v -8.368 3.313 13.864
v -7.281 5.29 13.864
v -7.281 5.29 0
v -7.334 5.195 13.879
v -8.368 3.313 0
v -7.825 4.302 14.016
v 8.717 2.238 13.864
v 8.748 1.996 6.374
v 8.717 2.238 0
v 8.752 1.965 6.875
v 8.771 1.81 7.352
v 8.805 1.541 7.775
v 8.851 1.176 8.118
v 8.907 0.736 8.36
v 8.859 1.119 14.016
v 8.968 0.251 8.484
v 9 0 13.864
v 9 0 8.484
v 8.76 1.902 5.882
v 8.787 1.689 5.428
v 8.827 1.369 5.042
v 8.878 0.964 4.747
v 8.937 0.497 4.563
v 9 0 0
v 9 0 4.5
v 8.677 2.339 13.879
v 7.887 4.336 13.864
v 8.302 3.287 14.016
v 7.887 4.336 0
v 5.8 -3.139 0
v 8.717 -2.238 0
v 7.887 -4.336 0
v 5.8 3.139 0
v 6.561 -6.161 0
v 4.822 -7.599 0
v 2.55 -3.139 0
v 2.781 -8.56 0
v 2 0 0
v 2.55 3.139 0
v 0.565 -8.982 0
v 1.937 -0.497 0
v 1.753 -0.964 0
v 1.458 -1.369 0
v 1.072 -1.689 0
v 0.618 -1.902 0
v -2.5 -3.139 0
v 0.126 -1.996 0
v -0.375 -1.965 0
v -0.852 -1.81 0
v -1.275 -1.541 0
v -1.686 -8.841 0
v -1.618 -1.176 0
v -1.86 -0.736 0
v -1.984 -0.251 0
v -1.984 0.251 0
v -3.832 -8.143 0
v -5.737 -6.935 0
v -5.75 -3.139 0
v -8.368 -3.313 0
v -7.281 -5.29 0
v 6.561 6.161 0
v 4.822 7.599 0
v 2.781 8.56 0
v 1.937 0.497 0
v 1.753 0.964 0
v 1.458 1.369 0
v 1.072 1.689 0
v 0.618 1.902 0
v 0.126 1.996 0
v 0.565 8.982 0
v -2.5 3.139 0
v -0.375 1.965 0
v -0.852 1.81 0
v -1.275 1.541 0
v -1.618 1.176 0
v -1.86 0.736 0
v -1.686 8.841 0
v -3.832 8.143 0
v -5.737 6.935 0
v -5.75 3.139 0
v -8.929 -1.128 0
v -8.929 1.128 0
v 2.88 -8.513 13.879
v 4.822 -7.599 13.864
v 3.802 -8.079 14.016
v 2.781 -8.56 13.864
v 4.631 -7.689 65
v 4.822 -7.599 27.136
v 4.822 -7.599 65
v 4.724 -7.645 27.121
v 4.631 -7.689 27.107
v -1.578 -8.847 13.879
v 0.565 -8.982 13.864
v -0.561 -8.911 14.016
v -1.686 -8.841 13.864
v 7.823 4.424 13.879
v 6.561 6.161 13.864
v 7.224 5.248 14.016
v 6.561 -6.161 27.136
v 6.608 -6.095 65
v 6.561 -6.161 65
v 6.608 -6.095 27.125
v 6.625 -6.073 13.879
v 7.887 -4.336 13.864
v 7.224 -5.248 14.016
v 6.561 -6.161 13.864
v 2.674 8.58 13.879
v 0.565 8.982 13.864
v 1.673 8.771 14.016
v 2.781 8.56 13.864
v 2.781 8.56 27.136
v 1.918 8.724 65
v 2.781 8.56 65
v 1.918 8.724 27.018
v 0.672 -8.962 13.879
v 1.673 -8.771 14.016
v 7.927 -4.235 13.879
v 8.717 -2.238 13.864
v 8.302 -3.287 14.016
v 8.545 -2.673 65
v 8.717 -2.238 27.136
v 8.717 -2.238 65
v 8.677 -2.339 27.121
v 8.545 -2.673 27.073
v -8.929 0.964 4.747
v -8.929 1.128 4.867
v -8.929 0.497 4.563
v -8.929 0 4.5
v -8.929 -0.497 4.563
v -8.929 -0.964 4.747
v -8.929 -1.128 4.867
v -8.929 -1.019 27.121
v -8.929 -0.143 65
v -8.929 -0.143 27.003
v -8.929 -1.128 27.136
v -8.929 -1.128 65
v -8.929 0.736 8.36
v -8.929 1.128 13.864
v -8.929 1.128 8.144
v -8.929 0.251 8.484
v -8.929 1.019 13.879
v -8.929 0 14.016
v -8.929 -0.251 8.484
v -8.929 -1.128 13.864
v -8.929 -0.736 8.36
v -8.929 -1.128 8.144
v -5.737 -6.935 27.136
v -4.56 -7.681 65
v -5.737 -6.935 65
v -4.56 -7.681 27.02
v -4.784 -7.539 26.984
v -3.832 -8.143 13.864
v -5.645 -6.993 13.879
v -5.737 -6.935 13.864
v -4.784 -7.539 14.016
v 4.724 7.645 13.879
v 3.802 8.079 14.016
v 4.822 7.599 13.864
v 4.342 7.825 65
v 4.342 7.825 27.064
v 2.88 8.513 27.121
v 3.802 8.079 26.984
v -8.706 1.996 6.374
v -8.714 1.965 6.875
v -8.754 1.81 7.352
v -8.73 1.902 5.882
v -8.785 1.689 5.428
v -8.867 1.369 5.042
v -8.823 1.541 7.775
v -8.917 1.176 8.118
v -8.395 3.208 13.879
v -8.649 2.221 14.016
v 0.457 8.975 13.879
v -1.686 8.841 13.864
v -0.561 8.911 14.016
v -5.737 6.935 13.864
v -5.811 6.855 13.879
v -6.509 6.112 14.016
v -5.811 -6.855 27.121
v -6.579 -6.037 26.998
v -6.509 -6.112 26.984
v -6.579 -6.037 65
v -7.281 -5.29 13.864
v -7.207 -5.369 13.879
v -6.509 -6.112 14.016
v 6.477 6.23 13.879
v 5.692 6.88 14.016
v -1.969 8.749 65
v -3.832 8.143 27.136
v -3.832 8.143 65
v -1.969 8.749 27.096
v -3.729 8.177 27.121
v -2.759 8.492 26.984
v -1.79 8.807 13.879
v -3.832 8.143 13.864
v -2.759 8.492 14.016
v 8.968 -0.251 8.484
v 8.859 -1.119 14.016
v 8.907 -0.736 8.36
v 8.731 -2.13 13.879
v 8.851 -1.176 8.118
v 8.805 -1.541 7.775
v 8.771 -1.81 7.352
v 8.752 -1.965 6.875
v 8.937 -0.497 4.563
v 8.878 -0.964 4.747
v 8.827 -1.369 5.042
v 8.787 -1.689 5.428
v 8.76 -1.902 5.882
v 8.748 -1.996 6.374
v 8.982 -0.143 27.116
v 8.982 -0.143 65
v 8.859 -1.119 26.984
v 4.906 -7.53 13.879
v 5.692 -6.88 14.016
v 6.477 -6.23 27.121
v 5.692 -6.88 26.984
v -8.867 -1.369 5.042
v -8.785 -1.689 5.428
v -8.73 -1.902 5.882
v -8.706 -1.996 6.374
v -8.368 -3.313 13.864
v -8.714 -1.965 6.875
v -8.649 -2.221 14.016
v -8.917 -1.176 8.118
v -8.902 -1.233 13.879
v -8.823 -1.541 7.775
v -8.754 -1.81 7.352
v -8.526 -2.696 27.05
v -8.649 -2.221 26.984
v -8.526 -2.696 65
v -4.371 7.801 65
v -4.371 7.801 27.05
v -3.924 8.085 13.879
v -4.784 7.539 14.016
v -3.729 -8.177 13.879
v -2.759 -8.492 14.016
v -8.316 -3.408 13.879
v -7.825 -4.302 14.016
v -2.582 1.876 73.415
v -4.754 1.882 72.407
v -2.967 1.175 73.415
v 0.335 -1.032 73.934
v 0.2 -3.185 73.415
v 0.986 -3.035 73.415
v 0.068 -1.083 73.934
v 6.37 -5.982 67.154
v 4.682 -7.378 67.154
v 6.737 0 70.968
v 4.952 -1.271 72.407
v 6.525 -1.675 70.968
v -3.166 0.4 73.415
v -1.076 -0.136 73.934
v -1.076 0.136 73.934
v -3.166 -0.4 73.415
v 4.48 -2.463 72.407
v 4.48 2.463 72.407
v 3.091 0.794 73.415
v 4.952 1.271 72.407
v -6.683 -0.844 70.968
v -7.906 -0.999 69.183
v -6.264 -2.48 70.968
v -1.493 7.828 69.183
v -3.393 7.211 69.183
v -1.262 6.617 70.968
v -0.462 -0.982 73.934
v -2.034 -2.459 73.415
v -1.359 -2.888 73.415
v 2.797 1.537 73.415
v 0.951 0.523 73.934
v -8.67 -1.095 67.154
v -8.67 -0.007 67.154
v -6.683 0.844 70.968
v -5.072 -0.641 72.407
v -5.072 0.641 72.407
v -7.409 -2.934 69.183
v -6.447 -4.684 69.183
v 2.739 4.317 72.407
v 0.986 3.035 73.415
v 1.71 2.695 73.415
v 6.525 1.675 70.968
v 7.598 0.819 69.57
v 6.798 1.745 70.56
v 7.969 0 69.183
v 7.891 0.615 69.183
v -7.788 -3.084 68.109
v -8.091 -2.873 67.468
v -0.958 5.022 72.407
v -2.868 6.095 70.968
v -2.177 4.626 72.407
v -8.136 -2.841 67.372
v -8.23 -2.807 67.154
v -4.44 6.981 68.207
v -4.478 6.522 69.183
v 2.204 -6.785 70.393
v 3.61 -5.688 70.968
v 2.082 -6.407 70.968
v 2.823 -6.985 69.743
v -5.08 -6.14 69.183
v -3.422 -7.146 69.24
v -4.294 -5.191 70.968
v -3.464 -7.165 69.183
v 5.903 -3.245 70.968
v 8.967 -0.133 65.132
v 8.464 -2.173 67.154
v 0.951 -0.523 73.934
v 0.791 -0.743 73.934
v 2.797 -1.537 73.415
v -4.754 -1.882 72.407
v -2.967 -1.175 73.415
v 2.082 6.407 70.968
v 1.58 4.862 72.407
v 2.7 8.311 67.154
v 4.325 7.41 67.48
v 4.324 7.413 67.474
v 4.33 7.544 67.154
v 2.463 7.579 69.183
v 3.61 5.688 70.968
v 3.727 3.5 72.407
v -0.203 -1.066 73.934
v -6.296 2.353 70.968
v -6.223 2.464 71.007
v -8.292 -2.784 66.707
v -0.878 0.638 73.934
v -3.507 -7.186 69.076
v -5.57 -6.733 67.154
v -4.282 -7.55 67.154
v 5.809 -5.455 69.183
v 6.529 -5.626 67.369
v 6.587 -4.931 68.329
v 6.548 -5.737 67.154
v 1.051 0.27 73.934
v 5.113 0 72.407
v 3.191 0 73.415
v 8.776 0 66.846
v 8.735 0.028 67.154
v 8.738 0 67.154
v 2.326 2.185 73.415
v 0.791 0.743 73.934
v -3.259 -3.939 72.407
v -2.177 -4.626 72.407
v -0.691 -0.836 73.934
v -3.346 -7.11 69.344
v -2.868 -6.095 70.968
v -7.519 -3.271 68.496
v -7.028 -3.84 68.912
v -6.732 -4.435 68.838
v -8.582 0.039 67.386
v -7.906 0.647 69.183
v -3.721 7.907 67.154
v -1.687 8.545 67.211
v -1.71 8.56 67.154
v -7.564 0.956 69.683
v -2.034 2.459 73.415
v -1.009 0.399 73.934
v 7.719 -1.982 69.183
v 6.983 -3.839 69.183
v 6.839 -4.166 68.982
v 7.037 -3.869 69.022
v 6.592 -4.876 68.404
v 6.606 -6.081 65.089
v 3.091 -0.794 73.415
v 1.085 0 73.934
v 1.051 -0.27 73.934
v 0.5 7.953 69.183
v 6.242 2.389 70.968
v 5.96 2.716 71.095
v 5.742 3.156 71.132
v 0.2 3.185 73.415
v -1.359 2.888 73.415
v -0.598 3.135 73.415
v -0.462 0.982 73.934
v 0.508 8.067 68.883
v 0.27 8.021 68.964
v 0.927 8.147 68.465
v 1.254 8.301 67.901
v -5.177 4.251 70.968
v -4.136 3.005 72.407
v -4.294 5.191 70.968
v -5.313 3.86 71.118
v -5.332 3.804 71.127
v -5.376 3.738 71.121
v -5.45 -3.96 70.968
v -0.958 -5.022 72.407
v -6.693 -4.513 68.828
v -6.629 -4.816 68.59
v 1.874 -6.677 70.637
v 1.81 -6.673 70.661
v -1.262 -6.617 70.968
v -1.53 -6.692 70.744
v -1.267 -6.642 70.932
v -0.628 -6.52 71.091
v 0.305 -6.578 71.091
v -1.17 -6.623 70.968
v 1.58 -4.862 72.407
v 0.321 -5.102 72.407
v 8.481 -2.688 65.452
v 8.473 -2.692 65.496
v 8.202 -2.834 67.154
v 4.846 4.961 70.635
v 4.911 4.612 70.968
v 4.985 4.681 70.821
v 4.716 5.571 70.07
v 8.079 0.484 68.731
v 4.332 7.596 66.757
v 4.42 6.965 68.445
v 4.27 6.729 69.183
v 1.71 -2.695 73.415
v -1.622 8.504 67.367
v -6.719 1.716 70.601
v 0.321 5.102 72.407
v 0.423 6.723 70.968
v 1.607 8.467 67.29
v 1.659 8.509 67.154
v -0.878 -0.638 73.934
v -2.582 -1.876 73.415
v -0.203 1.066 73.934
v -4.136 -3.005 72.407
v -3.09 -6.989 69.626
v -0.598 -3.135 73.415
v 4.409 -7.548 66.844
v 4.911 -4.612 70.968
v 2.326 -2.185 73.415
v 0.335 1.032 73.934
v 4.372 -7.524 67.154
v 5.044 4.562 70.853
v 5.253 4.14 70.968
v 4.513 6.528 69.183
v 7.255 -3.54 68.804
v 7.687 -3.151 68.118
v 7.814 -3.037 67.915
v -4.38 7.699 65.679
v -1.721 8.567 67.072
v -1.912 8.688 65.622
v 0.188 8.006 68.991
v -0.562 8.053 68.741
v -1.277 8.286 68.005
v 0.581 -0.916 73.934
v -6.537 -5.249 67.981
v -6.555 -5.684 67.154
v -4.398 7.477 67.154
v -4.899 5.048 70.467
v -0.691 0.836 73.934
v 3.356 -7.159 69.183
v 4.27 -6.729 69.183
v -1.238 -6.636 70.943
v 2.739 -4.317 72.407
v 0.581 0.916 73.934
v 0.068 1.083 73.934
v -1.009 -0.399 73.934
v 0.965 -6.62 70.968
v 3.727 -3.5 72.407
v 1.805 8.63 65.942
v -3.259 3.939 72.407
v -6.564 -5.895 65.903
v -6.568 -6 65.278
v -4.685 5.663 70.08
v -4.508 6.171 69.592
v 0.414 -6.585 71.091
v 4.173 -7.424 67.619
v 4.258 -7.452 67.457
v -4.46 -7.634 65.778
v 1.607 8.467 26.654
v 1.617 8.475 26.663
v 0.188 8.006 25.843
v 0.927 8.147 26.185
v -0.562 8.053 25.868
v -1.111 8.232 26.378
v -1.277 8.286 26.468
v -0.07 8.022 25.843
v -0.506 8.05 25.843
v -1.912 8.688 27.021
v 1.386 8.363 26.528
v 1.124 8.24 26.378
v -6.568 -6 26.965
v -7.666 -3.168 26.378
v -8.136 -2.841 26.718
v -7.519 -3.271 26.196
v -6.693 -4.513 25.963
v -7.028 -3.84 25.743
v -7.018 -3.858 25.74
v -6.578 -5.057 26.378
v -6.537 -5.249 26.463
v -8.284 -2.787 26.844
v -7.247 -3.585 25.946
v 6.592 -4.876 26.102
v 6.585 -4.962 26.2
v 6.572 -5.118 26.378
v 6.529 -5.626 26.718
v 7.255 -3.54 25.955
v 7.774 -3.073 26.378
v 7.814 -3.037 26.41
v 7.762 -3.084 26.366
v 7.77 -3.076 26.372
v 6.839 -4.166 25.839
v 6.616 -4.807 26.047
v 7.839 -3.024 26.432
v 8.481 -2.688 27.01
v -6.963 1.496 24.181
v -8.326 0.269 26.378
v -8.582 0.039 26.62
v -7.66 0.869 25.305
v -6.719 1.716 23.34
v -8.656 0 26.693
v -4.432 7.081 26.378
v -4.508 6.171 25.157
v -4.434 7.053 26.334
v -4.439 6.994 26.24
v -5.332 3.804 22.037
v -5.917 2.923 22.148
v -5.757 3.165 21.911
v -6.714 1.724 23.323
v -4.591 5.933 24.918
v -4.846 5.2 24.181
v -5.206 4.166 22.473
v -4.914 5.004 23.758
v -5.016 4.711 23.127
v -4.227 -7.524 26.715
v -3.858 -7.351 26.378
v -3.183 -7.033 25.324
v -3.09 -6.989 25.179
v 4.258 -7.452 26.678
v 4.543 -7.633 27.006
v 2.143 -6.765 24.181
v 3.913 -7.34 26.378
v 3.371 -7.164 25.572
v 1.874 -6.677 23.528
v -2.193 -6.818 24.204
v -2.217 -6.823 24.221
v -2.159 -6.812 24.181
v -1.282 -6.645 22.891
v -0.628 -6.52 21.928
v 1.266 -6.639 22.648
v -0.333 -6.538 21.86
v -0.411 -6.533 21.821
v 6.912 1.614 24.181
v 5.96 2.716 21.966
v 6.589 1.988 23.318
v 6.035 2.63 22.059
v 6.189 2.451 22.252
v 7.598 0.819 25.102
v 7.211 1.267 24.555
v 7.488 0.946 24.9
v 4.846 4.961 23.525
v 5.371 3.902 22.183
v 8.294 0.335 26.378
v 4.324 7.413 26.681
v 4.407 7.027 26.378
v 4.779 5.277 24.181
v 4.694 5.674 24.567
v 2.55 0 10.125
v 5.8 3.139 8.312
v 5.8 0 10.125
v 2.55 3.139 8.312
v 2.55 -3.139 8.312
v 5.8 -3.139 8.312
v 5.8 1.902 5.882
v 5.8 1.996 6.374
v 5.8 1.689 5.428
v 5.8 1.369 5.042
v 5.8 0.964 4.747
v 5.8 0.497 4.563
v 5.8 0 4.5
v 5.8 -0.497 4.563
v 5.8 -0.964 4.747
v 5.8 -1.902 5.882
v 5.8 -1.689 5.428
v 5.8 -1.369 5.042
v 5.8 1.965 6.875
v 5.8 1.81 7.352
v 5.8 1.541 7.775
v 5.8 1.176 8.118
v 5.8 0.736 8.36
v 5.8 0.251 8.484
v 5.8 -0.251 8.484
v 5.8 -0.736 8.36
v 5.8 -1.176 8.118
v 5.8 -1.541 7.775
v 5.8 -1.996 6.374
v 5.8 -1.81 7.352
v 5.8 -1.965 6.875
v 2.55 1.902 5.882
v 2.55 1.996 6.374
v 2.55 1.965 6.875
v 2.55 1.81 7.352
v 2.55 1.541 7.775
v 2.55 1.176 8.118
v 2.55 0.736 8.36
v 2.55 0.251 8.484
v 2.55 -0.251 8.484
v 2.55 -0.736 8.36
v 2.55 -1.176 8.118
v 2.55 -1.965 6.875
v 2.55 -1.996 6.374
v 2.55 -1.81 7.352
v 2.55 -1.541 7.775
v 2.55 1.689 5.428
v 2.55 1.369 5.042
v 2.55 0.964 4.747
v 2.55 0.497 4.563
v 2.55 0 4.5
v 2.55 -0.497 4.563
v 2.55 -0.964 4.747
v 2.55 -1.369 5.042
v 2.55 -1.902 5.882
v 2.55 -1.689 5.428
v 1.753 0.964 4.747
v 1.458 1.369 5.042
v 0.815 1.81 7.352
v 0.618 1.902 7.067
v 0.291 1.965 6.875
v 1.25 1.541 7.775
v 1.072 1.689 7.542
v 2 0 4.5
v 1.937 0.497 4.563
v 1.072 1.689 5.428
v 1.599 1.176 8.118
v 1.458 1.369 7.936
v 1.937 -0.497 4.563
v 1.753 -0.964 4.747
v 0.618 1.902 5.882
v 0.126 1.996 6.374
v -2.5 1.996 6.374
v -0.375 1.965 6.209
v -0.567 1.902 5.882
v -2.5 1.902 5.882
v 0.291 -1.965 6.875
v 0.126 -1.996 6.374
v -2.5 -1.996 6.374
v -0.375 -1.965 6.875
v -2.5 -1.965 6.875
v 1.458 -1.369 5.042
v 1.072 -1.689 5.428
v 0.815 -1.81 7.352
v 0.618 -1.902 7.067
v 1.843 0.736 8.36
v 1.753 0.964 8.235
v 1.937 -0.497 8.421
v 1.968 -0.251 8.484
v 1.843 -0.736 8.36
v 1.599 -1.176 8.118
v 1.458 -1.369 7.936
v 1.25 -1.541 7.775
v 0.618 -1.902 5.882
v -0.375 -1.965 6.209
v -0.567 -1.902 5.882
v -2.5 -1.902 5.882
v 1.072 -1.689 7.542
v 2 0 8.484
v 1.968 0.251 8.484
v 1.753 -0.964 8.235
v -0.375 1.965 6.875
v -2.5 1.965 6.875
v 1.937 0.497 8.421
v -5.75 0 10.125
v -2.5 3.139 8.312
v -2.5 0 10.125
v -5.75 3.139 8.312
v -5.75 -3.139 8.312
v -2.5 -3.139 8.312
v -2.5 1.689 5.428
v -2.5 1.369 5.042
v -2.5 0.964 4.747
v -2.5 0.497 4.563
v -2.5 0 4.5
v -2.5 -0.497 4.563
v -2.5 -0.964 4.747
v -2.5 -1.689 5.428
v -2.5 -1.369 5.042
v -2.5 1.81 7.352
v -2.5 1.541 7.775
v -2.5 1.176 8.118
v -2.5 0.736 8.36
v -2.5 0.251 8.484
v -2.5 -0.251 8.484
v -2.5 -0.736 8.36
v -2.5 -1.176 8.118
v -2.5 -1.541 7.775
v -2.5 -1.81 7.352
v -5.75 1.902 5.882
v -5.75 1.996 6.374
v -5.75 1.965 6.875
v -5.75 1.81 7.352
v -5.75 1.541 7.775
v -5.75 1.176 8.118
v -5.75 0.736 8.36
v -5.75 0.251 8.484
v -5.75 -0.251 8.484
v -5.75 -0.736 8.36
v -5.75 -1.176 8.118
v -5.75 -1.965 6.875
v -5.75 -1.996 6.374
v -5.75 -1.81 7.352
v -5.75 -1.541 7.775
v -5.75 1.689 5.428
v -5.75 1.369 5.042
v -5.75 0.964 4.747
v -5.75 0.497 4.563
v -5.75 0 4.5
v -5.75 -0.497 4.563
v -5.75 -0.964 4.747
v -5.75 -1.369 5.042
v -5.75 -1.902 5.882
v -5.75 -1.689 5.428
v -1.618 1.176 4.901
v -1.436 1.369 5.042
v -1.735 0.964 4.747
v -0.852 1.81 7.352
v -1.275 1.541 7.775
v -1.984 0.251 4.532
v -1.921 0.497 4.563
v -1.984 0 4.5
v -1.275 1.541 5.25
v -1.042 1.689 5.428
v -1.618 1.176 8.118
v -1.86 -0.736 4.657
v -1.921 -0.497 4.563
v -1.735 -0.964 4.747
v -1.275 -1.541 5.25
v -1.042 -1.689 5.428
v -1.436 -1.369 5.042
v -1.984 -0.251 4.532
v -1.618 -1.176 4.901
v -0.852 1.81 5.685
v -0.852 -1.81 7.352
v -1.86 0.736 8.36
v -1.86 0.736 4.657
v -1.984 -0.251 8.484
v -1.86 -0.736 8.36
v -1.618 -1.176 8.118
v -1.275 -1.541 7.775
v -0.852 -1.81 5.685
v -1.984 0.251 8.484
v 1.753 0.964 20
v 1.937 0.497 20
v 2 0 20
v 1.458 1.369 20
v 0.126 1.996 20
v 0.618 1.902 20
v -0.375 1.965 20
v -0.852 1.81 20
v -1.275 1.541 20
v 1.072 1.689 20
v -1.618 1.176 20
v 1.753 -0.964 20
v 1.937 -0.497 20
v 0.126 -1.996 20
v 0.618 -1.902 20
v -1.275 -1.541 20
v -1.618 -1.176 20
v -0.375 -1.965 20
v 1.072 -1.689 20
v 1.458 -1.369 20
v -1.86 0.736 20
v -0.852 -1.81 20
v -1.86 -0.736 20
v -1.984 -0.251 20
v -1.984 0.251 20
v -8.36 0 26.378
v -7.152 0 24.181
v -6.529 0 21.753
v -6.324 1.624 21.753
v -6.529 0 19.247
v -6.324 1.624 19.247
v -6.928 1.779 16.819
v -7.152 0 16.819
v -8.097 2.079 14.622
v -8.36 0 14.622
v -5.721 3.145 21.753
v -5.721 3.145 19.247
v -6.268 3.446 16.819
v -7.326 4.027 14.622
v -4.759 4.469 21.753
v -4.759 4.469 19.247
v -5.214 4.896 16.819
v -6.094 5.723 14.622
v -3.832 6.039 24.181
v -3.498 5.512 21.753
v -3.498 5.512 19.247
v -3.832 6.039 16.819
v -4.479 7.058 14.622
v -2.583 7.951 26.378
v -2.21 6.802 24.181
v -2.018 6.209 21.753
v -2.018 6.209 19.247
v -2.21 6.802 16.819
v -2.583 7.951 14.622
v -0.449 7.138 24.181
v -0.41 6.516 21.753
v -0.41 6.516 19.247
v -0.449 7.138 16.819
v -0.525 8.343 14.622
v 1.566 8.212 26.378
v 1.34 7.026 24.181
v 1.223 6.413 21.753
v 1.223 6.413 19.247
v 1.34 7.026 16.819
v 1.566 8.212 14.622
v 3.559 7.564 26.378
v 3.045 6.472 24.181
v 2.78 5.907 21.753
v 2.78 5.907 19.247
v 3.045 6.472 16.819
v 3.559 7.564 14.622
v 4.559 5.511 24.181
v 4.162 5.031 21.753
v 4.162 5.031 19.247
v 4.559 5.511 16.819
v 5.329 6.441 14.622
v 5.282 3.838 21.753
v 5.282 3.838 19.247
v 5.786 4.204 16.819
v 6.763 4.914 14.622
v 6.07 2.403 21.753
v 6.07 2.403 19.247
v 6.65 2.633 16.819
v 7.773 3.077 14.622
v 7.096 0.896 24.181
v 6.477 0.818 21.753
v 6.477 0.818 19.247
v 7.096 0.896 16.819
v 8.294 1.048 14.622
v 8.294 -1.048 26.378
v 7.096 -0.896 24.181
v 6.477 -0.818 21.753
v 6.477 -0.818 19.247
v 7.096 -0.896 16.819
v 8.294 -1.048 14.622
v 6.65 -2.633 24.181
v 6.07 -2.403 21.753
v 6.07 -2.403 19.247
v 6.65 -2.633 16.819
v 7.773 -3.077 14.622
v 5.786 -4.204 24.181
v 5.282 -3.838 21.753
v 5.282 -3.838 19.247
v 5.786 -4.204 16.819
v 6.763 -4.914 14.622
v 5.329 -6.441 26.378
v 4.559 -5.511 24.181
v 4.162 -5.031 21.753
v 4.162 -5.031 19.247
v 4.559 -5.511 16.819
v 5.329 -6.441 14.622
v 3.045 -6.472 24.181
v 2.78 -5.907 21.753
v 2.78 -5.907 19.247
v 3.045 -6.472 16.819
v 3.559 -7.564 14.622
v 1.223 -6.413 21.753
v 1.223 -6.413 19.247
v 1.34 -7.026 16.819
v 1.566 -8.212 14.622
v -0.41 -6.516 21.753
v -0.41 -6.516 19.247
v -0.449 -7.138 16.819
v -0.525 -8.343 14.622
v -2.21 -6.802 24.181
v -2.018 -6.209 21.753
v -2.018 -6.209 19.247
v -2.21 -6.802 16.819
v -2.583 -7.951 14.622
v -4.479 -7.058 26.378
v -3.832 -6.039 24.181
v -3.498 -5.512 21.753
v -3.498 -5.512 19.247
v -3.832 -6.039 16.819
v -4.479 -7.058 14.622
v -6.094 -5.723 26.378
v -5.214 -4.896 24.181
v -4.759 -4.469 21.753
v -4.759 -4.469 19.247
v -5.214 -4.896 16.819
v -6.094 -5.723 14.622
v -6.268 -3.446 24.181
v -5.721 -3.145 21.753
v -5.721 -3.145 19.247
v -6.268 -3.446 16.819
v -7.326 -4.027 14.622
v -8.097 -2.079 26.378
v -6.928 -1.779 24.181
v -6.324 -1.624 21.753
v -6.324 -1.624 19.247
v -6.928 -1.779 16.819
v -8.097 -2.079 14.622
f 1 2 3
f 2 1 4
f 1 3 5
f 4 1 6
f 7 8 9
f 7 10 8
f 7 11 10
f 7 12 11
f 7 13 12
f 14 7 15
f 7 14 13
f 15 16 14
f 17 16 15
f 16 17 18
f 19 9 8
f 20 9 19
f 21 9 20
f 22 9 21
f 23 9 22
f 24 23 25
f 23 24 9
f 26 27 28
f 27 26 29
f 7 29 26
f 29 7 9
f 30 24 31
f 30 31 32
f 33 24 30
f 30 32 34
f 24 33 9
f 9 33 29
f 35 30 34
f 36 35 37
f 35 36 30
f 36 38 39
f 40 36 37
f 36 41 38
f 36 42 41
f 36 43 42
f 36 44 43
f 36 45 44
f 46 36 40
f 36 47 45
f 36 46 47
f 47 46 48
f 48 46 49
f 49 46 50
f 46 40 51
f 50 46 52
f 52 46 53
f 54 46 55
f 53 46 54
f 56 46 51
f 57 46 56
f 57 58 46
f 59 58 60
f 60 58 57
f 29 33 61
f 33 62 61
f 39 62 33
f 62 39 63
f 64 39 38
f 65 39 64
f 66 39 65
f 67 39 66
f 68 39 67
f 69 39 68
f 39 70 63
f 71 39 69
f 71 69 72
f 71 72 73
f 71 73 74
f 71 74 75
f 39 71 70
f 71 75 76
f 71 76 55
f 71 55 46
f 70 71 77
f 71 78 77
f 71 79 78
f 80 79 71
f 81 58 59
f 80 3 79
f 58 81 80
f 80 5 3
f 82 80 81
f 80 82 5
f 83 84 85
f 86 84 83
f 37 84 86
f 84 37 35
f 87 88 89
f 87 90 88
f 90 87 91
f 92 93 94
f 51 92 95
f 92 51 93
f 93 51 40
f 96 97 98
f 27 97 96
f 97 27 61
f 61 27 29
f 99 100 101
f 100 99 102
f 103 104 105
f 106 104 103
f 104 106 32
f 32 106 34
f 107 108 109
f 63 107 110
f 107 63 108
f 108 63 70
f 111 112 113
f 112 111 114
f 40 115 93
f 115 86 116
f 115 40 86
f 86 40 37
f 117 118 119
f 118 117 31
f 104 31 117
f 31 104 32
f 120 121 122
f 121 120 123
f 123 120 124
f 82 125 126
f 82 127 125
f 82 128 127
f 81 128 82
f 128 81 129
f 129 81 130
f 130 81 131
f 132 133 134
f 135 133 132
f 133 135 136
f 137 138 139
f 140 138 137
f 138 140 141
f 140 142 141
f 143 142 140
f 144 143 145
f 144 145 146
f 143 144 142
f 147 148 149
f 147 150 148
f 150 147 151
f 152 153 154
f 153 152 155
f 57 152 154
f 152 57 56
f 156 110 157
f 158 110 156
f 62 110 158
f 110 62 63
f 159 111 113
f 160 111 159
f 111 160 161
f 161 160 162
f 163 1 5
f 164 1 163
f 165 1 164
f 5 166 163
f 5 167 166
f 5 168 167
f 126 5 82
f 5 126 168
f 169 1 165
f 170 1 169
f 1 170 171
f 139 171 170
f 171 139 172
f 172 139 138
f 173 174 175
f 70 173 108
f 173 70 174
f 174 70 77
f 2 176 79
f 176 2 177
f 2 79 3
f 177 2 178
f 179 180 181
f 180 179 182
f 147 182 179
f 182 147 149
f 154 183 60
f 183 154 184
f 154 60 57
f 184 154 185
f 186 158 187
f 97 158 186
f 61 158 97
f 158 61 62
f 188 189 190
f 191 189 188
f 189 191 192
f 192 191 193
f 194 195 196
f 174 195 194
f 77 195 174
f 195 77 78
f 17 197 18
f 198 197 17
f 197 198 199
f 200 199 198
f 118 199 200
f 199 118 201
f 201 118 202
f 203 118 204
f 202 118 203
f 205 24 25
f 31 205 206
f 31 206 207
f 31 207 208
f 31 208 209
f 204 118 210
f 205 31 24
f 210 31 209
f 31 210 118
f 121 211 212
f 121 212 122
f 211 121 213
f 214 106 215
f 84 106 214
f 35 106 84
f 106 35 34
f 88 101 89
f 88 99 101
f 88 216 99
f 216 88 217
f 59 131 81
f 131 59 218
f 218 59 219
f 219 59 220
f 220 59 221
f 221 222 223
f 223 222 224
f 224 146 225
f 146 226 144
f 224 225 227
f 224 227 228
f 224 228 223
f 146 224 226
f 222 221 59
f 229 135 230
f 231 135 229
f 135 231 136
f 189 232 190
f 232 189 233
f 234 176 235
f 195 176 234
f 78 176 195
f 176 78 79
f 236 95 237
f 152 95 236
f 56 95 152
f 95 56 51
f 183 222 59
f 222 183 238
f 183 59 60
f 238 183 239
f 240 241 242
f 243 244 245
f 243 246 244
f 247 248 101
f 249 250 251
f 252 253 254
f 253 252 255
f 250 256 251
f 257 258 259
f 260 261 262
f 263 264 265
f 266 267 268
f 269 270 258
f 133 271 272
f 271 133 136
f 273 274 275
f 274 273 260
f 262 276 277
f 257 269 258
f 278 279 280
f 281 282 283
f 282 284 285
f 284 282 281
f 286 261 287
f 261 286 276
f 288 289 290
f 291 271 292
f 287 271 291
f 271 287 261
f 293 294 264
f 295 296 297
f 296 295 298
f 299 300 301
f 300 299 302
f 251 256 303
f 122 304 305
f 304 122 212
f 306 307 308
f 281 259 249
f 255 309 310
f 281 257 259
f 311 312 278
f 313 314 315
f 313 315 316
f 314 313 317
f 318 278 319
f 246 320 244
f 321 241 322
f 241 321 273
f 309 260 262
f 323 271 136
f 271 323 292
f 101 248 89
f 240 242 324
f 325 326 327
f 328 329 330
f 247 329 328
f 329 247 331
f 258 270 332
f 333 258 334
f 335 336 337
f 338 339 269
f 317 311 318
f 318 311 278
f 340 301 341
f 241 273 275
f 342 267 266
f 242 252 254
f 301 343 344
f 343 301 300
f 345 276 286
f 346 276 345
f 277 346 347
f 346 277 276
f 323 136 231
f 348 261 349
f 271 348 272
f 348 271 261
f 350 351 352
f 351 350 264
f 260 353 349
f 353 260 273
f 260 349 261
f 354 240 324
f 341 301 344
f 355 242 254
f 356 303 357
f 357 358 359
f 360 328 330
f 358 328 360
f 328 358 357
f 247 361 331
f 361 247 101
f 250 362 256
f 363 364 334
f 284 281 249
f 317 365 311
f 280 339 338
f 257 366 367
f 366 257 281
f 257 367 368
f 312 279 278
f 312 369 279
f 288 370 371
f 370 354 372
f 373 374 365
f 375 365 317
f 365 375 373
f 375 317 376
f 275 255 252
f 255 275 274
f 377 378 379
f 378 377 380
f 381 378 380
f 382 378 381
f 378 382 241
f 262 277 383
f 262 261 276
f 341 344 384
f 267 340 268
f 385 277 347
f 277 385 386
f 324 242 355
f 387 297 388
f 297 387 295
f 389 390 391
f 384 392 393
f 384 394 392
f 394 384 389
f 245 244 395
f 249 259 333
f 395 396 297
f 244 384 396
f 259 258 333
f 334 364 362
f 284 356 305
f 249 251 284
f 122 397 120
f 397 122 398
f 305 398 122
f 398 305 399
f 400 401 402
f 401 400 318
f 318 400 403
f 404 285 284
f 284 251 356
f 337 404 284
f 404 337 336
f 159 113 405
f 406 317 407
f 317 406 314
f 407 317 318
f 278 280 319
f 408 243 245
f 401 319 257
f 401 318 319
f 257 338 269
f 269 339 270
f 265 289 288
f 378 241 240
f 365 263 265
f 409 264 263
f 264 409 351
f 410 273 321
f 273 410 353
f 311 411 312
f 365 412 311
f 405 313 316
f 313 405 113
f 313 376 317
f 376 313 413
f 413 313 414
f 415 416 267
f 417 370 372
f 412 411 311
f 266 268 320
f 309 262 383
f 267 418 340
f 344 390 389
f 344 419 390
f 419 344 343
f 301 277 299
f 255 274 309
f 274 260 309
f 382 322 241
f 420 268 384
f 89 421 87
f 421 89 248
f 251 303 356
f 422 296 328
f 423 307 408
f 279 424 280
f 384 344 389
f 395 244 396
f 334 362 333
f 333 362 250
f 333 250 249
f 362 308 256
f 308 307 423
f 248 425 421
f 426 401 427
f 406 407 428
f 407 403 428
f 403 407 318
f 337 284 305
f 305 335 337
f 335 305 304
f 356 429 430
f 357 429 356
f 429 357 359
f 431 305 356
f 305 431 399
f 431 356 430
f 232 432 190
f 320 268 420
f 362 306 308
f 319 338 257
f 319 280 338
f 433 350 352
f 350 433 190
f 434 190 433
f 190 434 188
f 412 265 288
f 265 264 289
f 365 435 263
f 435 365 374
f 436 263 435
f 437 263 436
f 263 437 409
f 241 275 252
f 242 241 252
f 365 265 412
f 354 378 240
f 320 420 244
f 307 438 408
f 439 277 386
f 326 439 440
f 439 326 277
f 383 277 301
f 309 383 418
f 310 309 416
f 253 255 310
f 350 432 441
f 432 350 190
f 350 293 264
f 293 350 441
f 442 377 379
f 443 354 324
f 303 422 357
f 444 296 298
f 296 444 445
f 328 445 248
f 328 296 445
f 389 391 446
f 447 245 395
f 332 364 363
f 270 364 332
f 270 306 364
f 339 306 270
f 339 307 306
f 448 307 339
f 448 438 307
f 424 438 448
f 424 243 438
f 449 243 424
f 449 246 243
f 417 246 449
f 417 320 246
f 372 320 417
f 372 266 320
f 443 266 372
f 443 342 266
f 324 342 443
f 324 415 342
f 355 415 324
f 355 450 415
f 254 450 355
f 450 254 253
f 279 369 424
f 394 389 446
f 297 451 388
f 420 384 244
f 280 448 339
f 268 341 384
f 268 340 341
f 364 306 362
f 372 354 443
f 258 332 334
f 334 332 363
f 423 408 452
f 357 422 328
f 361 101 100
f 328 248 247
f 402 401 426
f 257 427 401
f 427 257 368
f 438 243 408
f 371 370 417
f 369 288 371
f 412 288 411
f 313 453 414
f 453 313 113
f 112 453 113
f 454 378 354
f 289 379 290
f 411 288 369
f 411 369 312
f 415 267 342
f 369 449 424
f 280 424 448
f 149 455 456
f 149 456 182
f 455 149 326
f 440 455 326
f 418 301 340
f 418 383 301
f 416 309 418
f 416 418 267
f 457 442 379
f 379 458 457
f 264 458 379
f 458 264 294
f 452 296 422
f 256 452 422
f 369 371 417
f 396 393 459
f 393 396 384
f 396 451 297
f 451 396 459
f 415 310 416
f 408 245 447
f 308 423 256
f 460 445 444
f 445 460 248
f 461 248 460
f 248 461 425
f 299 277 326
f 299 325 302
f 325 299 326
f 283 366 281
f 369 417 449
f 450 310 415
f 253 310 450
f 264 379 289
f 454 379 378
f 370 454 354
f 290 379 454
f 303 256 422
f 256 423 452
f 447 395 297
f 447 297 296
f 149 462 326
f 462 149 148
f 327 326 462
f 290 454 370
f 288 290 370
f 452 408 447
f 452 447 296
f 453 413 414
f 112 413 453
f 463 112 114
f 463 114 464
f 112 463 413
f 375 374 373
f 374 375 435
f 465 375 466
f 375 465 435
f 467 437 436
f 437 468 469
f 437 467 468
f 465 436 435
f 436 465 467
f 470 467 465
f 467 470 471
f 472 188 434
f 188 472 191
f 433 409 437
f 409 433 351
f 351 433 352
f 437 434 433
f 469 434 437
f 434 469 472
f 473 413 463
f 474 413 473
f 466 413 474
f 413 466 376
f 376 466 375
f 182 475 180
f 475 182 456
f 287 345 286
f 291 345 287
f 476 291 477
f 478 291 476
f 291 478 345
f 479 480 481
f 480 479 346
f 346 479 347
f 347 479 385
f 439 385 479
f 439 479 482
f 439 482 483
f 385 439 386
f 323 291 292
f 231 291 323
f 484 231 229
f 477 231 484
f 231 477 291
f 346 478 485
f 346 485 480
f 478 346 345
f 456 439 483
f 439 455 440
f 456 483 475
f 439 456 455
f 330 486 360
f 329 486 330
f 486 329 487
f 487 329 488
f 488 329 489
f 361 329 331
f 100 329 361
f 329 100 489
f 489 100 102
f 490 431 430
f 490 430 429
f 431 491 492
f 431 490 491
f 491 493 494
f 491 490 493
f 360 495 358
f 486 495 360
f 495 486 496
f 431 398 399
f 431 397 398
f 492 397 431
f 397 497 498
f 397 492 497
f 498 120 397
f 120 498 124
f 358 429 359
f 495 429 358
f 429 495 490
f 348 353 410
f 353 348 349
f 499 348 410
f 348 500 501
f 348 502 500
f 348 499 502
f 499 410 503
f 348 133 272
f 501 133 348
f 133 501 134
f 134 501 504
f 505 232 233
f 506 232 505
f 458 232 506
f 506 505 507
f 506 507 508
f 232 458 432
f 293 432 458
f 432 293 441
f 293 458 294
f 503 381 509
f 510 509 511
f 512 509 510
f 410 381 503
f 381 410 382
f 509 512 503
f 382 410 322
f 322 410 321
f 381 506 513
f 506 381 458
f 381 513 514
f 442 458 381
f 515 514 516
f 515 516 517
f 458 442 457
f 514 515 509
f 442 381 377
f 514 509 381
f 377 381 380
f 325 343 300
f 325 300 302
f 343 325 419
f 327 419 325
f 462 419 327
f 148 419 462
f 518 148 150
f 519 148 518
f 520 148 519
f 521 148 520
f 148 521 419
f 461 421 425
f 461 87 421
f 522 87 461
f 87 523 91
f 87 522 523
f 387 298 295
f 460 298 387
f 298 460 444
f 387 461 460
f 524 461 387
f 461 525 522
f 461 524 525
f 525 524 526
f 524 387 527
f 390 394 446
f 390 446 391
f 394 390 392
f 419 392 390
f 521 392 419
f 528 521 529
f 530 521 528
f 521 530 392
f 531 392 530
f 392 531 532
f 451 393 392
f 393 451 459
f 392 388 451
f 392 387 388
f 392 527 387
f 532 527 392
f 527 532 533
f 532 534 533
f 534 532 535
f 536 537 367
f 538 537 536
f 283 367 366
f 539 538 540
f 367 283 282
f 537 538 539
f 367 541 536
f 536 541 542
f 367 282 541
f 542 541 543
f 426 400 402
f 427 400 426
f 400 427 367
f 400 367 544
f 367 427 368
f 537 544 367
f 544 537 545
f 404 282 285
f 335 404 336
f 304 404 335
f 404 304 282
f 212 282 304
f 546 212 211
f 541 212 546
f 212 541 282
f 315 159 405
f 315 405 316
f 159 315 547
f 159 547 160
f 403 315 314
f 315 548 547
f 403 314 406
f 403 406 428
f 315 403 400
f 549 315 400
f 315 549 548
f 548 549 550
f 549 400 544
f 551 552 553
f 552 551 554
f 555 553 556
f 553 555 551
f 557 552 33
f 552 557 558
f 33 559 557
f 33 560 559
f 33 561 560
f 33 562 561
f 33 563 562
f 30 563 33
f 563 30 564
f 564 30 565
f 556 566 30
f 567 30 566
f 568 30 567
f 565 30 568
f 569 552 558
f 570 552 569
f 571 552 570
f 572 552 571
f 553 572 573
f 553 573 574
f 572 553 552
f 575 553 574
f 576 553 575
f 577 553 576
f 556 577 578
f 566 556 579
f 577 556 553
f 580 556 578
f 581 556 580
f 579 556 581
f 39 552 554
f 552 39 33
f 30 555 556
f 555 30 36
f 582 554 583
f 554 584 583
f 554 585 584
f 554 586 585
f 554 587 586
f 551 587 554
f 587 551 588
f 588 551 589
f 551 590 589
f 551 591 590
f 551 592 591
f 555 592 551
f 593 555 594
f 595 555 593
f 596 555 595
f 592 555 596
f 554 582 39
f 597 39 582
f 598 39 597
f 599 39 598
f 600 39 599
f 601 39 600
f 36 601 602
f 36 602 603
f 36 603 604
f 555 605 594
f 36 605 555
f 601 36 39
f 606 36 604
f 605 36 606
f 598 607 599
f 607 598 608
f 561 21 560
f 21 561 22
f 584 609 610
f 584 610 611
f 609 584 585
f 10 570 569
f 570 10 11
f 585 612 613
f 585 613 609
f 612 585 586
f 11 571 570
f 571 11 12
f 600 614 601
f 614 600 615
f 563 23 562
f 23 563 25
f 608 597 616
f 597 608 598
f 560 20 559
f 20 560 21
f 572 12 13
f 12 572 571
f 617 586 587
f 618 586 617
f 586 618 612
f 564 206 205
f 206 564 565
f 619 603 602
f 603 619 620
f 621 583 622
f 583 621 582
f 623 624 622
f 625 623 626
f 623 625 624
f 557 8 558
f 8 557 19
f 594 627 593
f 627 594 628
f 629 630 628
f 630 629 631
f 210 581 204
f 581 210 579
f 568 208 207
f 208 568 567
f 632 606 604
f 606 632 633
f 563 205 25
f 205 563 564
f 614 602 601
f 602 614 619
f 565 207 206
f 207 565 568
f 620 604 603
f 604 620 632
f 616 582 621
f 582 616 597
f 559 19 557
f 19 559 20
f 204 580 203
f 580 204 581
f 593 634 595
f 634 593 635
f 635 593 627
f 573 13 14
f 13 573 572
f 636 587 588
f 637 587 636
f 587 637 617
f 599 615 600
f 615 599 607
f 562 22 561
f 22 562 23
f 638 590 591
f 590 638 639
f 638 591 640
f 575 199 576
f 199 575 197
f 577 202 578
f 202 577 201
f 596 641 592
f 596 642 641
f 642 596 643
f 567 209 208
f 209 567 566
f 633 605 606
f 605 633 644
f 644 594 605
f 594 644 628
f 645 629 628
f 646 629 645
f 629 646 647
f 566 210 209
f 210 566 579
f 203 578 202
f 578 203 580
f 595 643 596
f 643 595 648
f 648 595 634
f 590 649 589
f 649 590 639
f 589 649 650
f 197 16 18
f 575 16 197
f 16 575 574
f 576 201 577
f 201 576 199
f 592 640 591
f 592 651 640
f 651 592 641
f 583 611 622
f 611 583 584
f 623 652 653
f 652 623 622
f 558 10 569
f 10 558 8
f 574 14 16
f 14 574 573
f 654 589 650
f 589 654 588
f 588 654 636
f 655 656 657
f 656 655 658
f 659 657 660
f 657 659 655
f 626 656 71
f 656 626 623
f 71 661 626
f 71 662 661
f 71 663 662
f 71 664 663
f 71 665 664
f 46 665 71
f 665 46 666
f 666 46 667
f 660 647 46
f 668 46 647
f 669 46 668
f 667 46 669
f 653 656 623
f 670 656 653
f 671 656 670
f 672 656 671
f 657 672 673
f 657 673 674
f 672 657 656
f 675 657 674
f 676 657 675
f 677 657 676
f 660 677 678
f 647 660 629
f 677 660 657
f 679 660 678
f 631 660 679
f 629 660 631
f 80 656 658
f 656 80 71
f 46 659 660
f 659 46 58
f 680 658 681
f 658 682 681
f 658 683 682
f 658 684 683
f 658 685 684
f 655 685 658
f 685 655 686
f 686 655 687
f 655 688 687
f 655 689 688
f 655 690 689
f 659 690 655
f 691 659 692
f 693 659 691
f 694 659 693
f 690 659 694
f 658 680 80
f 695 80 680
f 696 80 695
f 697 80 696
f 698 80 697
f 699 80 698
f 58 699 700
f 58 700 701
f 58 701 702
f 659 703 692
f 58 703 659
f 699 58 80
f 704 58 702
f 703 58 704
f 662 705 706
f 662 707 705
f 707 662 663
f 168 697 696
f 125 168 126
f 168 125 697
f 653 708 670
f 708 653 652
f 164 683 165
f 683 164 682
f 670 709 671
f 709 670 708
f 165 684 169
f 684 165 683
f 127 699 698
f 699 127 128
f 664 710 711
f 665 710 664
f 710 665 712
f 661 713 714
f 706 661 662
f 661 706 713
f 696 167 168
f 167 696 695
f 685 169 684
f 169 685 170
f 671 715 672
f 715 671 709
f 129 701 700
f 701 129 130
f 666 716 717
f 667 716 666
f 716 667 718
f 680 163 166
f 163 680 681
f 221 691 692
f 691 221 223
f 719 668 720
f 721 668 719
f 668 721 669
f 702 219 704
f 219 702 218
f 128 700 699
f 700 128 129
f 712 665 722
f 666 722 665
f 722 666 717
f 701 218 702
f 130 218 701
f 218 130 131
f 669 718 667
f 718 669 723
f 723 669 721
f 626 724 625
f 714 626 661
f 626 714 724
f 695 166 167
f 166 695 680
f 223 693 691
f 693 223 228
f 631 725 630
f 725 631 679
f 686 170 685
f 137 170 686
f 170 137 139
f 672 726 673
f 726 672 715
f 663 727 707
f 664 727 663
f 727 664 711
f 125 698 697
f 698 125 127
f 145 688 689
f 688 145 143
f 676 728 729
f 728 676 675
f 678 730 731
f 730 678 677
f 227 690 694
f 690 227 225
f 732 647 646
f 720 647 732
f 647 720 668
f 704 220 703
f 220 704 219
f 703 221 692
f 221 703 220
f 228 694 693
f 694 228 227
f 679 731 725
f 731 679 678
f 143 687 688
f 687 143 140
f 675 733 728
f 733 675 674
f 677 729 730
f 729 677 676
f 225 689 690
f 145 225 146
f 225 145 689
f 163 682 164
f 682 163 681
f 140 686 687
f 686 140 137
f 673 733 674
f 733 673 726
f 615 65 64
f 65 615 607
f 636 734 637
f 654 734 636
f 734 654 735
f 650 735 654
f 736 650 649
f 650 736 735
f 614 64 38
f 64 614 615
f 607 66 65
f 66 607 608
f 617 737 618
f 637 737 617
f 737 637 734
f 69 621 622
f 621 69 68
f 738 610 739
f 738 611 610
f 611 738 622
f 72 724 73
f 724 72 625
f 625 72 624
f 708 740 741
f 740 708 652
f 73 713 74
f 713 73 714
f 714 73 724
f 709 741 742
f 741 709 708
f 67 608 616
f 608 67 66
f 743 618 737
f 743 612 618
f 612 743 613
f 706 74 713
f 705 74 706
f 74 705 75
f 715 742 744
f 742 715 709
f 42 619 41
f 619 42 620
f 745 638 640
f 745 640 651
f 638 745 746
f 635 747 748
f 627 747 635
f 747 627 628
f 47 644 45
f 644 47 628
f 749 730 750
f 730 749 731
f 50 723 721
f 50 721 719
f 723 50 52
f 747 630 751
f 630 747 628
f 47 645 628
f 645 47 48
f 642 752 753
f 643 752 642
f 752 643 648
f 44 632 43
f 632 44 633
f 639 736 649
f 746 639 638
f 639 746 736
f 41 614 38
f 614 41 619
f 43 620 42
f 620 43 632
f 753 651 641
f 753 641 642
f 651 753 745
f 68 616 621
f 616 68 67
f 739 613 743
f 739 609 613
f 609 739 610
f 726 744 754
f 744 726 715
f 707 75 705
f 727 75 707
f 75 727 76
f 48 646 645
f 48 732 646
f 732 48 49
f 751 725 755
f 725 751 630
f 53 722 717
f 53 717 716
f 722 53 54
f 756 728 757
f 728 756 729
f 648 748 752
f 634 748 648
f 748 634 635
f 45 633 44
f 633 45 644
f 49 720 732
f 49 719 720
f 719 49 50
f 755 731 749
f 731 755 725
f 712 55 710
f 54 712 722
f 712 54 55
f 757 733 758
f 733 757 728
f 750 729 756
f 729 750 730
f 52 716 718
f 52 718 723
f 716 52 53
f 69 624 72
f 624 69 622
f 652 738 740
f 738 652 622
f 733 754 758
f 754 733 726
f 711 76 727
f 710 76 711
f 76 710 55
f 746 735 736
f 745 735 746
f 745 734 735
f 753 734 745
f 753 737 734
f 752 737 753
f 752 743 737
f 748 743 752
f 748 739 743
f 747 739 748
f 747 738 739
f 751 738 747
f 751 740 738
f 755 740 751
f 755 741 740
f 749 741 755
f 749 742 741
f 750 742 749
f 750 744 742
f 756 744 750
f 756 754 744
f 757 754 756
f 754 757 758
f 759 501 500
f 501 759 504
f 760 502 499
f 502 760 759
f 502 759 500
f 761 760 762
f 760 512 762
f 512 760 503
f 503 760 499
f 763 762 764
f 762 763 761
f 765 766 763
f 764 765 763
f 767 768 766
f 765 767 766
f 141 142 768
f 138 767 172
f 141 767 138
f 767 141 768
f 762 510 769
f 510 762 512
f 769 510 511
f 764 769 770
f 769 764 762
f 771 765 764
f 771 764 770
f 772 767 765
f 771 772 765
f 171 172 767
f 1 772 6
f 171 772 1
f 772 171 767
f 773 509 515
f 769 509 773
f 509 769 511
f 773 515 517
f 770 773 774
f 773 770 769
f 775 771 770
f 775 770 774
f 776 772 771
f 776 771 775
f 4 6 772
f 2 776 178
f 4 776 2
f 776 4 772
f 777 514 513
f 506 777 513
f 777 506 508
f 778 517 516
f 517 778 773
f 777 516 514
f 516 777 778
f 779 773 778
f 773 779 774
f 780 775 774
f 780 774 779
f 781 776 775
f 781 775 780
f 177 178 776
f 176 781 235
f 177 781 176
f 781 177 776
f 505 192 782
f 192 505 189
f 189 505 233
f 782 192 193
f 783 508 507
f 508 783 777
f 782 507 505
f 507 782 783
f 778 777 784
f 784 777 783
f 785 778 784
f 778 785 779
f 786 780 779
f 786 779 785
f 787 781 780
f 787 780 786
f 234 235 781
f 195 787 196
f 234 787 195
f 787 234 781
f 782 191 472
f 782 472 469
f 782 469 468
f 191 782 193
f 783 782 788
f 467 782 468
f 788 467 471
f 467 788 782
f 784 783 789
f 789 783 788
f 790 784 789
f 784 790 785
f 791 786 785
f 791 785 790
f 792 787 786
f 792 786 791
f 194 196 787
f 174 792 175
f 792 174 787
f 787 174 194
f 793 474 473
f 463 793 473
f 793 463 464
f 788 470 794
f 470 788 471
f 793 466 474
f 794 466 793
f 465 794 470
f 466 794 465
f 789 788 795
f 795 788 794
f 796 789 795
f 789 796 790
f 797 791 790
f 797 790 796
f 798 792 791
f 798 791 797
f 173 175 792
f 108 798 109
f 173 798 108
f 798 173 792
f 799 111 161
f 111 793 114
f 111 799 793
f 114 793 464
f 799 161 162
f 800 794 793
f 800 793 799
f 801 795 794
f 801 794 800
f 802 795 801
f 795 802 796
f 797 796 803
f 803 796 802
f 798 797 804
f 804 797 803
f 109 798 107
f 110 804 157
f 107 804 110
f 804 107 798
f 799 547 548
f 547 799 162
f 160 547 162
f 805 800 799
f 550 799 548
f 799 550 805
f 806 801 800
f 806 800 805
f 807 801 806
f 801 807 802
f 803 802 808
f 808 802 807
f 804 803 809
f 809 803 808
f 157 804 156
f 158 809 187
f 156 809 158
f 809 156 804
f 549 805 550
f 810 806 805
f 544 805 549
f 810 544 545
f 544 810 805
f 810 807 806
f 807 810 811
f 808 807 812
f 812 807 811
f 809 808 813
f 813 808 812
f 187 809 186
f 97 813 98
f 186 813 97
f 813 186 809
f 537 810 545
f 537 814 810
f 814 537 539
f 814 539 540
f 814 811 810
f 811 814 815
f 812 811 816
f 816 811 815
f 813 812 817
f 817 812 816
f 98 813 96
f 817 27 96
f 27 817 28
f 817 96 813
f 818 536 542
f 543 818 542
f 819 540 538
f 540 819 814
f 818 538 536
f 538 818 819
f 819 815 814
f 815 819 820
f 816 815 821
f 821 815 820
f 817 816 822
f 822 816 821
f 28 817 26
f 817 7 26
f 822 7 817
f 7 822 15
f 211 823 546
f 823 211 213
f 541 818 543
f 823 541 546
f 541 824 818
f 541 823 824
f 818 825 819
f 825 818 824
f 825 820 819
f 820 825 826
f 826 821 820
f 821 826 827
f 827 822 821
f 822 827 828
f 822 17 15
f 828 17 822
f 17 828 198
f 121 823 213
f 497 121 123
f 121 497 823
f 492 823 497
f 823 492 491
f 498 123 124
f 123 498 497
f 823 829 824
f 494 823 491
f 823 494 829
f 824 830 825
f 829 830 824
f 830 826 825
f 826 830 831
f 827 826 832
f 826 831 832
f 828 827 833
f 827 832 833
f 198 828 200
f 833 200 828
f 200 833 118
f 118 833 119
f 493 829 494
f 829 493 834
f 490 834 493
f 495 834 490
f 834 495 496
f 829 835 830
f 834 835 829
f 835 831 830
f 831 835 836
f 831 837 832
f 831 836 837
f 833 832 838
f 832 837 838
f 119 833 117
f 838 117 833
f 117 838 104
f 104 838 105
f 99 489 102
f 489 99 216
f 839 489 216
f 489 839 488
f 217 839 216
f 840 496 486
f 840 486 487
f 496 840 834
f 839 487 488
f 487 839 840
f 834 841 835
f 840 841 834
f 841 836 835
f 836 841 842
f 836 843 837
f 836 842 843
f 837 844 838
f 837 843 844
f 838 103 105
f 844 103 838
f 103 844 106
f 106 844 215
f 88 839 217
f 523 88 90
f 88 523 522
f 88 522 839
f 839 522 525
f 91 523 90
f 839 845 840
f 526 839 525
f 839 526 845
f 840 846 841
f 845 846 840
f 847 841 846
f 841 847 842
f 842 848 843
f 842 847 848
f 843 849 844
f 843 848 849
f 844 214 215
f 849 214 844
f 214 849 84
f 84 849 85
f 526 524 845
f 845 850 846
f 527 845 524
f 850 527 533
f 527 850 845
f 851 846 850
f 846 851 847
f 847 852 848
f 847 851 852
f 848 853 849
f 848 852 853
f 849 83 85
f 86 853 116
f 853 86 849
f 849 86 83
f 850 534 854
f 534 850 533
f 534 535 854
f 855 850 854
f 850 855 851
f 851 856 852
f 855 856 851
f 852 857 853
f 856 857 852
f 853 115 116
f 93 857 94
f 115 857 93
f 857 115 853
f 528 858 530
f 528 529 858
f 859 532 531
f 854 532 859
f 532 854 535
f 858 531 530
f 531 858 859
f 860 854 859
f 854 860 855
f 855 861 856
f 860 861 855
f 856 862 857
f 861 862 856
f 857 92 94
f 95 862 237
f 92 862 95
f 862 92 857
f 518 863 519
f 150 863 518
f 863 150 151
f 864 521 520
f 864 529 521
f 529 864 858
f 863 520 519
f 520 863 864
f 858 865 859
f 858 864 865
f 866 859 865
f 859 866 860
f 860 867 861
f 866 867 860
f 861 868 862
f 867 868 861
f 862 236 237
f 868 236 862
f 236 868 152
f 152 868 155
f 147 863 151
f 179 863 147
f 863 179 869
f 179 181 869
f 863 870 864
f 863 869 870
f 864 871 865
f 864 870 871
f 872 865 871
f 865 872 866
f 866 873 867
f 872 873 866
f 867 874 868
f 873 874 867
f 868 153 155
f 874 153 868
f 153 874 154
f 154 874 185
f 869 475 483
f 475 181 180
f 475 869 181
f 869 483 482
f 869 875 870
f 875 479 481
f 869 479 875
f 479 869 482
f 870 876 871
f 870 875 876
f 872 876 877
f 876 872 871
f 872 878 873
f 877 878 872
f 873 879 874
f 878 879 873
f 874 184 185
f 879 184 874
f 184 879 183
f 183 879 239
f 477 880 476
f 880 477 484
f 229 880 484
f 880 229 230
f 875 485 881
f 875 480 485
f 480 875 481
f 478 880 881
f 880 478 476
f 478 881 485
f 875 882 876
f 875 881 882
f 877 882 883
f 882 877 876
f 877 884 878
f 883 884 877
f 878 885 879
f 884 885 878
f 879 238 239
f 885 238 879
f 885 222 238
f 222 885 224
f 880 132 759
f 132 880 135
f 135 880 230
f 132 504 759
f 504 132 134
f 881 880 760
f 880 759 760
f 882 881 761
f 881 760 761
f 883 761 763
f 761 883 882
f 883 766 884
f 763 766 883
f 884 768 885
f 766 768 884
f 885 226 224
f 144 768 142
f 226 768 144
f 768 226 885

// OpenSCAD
// [FL_INDEX: keywords="openscad, 3d_parametric, Customizable_Drill_Bit_Handles, csg_solid" | COT="Parametric OpenSCAD design from 3DCodeverse"]
// Title: Customizable Drill Bit Handles


//Variables

// preview[view:north east, tilt:side]

//The units of your Drill Bit.
Drill_Bit_Diameter_Units=1; //[1: Millimeter, 2:Inches]

//Diameter of the Drill bit.  Only accepts Decimals. No Fractions
Drill_Bit_Diameter=3; 

//Drill Bit Length: How Far do you want the Drill Bit to go into the Handle
Drill_Bit_Length=20;

//Length of the Handle
Handle_Length=65; 

//Diameter of the Handle
Handle_Diameter=15; 


//Diameter of the set Screw
Set_Screw_Diameter=3; 

//Thickness of the set Screw Nut
Set_Screw_Nut_Thickness=3; 

//Diameter of the Set Screw Nut
Set_Screw_Nut_Diameter=5.5; 

//Number of Nut Traps
Number_of_Nut_Traps=2;

//The Overall Resolution of the Handle
Resolution=25; 

//Ignore these variables


db_d=Drill_Bit_Diameter;
hl=Handle_Length;
hd=Handle_Diameter;
db_l=Drill_Bit_Length;
db_d=Drill_Bit_Diameter;
ss_d=Set_Screw_Diameter;
ss_n_t=Set_Screw_Nut_Thickness;
ss_n_d=Set_Screw_Nut_Diameter;
$fn=Resolution;




if(Drill_Bit_Diameter_Units==1){
Drill_Bit_Handle_Metric();
}
if(Drill_Bit_Diameter_Units==2){
Drill_Bit_Handle();
}




module Drill_Bit_Handle_Metric(){

	difference(){
	
		//Main Body of the Drill Bit Handle
		union(){

			cylinder(hl,(hd+db_d)/2,(hd+db_d)/2); 
			translate([0,0,hl])
				sphere((hd+db_d)/2);

		}

		//Hole for Drill Bit
		cylinder(db_l,(db_d+1)/2,(db_d+1)/2); 
	
		
		//This is the Groove on the bottom of the handle	
		translate([0,0,(ss_n_d)+15])
			rotate_extrude(convexity = 10)
				translate([((hd+db_d)/2)+7.45, 0, 0])
					circle(r = 10);
	
		// Small Grooves for the Handle
		for ( i = [0 : 3] ){	
		    rotate( i * 360 / 3, [0, 0, 1])
		  	  translate([0, ((hd+db_d)/2)+2, (ss_n_d/2)+17])
		  		 cylinder(hl-((ss_n_d/2)),3,3);
		}
			
			//Large Grooves for the handle
			
			
				rotate([0,0,360/6]){
					for ( i = [0 : 3] ){	
					    rotate( i * 360 / 3, [0, 0, 1])
					  	  translate([0,  ((hd+db_d)+(13)+2)/2, (ss_n_d/2)+17])
					  		cylinder(hl-((ss_n_d/2)),(20)/2,(20)/2);
					}
				}
			
		
		
			//Nut Trap
		
		if (Number_of_Nut_Traps==2){
		
			translate([db_d/2+(ss_n_t-.45),0,ss_n_d+1]){
			
			union(){
				hull(){
		
					rotate([0,90,0])
						translate([0,0,ss_n_t/-2])
							hexagon(ss_n_t+.25,(ss_n_d+1.75)/2);
		
					rotate([0,90,0])
						translate([(ss_n_d/2)+10,0,ss_n_t/-2])
							hexagon(ss_n_t+.25,(ss_n_d+1.75)/2);
		
				}
	
			rotate([0,90,0])
				translate([0,0,(hd+db_d)/-7+ss_n_t/-2])
					cylinder((hd+db_d+1)/2,(ss_d+1)/2,(ss_d+1)/2);
		
			}
			}
			
			}
			//Nut Trap
			translate([db_d/-2-(ss_n_t-.25),0,ss_n_d+1]){
		
				hull(){
		
					rotate([0,90,0])
						translate([0,0,ss_n_t/-2])
							hexagon(ss_n_t+.25,(ss_n_d+1.75)/2);
		
					rotate([0,90,0])
						translate([(ss_n_d/2)+10,0,ss_n_t/-2])
							hexagon(ss_n_t+.25,(ss_n_d+1.75)/2);
		
				}
	
			rotate([0,90,0])
				translate([0,0,(hd+db_d)/-5.1+ss_n_t/-2])
					cylinder((hd+db_d+1)/2,(ss_d+1)/2,(ss_d+1)/2);
		
			}
	
	}
	

	}

module Drill_Bit_Handle(){

difference(){

	//Main Body of the Drill Bit Handle
	union(){
	
		cylinder(hl,(hd+(db_d*25.4))/2,(hd+(db_d*25.4))/2); 
	
		translate([0,0,hl])	
			sphere((hd+(db_d*25.4))/2);
	
	}
	
	//Hole for Drill Bit
	cylinder(db_l,((db_d*25.4)+1)/2,((db_d*25.4)+1)/2); 

	//This is the Groove on the bottom of the handle 

	translate([0,0,(ss_n_d)+15])
		rotate_extrude(convexity = 10)
			translate([((hd+(db_d*25.4))/2)+7.45, 0, 0])
				circle(r = 10);

	// Small Grooves for the Handle
	for ( i = [0 : 3] ){ 

		rotate( i * 360 / 3, [0, 0, 1])

		translate([0, ((hd+(db_d*25.4))/2)+2, (ss_n_d/2)+17])
			cylinder(hl-((ss_n_d/2)),3,3);

	}
	//Large Grooves for the handle
	rotate([0,0,360/6]){

		for ( i = [0 : 3] ){ 

		rotate( i * 360 / 3, [0, 0, 1])

		translate([0, ((hd+(db_d*25.4))+(13)+2)/2, (ss_n_d/2)+17])
			cylinder(hl-((ss_n_d/2)),(20)/2,(20)/2);

		}

	}

	//Nut Trap
	if (Number_of_Nut_Traps==2){

		translate([(db_d*25.4)/2+(ss_n_t-.45),0,ss_n_d+1]){

			union(){

				hull(){

					rotate([0,90,0])
						translate([0,0,ss_n_t/-2])
							hexagon(ss_n_t+.25,(ss_n_d+1.75)/2);

	rotate([0,90,0])
		translate([(ss_n_d/2)+10,0,ss_n_t/-2])
			hexagon(ss_n_t+.25,(ss_n_d+1.75)/2);

	}

	rotate([0,90,0])
		translate([0,0,(hd+(db_d*25.4))/-7+ss_n_t/-2])
			cylinder((hd+(db_d*25.4)+1)/2,(ss_d+1)/2,(ss_d+1)/2);

	}

	}

	}

	//Nut Trap

	translate([(db_d*25.4)/-2-(ss_n_t-.25),0,ss_n_d+1]){

		hull(){
	
		rotate([0,90,0])
			translate([0,0,ss_n_t/-2])
				hexagon(ss_n_t+.25,(ss_n_d+1.75)/2);
	
		rotate([0,90,0])
			translate([(ss_n_d/2)+10,0,ss_n_t/-2])
				hexagon(ss_n_t+.25,(ss_n_d+1.75)/2);
	
		}

	rotate([0,90,0])
		translate([0,0,(hd+(db_d*25.4))/-5.1+ss_n_t/-2])
			cylinder((hd+(db_d*25.4)+1)/2,(ss_d+1)/2,(ss_d+1)/2);

	}

	}

}



			
			



module reg_polygon(sides,radius)
{
  function dia(r) = sqrt(pow(r*2,2)/2);  //sqrt((r*2^2)/2) if only we had an exponention op
  if(sides<2) square([radius,0]);
  if(sides==3) triangle(radius);
  if(sides==4) square([dia(radius),dia(radius)],center=true);
  if(sides>4) circle(r=radius,$fn=sides);
}

module hexagonf(radius)
{
  reg_polygon(6,radius);
}

module hexagon(height,radius) 
{
  linear_extrude(height=height) hexagonf(radius);
}
